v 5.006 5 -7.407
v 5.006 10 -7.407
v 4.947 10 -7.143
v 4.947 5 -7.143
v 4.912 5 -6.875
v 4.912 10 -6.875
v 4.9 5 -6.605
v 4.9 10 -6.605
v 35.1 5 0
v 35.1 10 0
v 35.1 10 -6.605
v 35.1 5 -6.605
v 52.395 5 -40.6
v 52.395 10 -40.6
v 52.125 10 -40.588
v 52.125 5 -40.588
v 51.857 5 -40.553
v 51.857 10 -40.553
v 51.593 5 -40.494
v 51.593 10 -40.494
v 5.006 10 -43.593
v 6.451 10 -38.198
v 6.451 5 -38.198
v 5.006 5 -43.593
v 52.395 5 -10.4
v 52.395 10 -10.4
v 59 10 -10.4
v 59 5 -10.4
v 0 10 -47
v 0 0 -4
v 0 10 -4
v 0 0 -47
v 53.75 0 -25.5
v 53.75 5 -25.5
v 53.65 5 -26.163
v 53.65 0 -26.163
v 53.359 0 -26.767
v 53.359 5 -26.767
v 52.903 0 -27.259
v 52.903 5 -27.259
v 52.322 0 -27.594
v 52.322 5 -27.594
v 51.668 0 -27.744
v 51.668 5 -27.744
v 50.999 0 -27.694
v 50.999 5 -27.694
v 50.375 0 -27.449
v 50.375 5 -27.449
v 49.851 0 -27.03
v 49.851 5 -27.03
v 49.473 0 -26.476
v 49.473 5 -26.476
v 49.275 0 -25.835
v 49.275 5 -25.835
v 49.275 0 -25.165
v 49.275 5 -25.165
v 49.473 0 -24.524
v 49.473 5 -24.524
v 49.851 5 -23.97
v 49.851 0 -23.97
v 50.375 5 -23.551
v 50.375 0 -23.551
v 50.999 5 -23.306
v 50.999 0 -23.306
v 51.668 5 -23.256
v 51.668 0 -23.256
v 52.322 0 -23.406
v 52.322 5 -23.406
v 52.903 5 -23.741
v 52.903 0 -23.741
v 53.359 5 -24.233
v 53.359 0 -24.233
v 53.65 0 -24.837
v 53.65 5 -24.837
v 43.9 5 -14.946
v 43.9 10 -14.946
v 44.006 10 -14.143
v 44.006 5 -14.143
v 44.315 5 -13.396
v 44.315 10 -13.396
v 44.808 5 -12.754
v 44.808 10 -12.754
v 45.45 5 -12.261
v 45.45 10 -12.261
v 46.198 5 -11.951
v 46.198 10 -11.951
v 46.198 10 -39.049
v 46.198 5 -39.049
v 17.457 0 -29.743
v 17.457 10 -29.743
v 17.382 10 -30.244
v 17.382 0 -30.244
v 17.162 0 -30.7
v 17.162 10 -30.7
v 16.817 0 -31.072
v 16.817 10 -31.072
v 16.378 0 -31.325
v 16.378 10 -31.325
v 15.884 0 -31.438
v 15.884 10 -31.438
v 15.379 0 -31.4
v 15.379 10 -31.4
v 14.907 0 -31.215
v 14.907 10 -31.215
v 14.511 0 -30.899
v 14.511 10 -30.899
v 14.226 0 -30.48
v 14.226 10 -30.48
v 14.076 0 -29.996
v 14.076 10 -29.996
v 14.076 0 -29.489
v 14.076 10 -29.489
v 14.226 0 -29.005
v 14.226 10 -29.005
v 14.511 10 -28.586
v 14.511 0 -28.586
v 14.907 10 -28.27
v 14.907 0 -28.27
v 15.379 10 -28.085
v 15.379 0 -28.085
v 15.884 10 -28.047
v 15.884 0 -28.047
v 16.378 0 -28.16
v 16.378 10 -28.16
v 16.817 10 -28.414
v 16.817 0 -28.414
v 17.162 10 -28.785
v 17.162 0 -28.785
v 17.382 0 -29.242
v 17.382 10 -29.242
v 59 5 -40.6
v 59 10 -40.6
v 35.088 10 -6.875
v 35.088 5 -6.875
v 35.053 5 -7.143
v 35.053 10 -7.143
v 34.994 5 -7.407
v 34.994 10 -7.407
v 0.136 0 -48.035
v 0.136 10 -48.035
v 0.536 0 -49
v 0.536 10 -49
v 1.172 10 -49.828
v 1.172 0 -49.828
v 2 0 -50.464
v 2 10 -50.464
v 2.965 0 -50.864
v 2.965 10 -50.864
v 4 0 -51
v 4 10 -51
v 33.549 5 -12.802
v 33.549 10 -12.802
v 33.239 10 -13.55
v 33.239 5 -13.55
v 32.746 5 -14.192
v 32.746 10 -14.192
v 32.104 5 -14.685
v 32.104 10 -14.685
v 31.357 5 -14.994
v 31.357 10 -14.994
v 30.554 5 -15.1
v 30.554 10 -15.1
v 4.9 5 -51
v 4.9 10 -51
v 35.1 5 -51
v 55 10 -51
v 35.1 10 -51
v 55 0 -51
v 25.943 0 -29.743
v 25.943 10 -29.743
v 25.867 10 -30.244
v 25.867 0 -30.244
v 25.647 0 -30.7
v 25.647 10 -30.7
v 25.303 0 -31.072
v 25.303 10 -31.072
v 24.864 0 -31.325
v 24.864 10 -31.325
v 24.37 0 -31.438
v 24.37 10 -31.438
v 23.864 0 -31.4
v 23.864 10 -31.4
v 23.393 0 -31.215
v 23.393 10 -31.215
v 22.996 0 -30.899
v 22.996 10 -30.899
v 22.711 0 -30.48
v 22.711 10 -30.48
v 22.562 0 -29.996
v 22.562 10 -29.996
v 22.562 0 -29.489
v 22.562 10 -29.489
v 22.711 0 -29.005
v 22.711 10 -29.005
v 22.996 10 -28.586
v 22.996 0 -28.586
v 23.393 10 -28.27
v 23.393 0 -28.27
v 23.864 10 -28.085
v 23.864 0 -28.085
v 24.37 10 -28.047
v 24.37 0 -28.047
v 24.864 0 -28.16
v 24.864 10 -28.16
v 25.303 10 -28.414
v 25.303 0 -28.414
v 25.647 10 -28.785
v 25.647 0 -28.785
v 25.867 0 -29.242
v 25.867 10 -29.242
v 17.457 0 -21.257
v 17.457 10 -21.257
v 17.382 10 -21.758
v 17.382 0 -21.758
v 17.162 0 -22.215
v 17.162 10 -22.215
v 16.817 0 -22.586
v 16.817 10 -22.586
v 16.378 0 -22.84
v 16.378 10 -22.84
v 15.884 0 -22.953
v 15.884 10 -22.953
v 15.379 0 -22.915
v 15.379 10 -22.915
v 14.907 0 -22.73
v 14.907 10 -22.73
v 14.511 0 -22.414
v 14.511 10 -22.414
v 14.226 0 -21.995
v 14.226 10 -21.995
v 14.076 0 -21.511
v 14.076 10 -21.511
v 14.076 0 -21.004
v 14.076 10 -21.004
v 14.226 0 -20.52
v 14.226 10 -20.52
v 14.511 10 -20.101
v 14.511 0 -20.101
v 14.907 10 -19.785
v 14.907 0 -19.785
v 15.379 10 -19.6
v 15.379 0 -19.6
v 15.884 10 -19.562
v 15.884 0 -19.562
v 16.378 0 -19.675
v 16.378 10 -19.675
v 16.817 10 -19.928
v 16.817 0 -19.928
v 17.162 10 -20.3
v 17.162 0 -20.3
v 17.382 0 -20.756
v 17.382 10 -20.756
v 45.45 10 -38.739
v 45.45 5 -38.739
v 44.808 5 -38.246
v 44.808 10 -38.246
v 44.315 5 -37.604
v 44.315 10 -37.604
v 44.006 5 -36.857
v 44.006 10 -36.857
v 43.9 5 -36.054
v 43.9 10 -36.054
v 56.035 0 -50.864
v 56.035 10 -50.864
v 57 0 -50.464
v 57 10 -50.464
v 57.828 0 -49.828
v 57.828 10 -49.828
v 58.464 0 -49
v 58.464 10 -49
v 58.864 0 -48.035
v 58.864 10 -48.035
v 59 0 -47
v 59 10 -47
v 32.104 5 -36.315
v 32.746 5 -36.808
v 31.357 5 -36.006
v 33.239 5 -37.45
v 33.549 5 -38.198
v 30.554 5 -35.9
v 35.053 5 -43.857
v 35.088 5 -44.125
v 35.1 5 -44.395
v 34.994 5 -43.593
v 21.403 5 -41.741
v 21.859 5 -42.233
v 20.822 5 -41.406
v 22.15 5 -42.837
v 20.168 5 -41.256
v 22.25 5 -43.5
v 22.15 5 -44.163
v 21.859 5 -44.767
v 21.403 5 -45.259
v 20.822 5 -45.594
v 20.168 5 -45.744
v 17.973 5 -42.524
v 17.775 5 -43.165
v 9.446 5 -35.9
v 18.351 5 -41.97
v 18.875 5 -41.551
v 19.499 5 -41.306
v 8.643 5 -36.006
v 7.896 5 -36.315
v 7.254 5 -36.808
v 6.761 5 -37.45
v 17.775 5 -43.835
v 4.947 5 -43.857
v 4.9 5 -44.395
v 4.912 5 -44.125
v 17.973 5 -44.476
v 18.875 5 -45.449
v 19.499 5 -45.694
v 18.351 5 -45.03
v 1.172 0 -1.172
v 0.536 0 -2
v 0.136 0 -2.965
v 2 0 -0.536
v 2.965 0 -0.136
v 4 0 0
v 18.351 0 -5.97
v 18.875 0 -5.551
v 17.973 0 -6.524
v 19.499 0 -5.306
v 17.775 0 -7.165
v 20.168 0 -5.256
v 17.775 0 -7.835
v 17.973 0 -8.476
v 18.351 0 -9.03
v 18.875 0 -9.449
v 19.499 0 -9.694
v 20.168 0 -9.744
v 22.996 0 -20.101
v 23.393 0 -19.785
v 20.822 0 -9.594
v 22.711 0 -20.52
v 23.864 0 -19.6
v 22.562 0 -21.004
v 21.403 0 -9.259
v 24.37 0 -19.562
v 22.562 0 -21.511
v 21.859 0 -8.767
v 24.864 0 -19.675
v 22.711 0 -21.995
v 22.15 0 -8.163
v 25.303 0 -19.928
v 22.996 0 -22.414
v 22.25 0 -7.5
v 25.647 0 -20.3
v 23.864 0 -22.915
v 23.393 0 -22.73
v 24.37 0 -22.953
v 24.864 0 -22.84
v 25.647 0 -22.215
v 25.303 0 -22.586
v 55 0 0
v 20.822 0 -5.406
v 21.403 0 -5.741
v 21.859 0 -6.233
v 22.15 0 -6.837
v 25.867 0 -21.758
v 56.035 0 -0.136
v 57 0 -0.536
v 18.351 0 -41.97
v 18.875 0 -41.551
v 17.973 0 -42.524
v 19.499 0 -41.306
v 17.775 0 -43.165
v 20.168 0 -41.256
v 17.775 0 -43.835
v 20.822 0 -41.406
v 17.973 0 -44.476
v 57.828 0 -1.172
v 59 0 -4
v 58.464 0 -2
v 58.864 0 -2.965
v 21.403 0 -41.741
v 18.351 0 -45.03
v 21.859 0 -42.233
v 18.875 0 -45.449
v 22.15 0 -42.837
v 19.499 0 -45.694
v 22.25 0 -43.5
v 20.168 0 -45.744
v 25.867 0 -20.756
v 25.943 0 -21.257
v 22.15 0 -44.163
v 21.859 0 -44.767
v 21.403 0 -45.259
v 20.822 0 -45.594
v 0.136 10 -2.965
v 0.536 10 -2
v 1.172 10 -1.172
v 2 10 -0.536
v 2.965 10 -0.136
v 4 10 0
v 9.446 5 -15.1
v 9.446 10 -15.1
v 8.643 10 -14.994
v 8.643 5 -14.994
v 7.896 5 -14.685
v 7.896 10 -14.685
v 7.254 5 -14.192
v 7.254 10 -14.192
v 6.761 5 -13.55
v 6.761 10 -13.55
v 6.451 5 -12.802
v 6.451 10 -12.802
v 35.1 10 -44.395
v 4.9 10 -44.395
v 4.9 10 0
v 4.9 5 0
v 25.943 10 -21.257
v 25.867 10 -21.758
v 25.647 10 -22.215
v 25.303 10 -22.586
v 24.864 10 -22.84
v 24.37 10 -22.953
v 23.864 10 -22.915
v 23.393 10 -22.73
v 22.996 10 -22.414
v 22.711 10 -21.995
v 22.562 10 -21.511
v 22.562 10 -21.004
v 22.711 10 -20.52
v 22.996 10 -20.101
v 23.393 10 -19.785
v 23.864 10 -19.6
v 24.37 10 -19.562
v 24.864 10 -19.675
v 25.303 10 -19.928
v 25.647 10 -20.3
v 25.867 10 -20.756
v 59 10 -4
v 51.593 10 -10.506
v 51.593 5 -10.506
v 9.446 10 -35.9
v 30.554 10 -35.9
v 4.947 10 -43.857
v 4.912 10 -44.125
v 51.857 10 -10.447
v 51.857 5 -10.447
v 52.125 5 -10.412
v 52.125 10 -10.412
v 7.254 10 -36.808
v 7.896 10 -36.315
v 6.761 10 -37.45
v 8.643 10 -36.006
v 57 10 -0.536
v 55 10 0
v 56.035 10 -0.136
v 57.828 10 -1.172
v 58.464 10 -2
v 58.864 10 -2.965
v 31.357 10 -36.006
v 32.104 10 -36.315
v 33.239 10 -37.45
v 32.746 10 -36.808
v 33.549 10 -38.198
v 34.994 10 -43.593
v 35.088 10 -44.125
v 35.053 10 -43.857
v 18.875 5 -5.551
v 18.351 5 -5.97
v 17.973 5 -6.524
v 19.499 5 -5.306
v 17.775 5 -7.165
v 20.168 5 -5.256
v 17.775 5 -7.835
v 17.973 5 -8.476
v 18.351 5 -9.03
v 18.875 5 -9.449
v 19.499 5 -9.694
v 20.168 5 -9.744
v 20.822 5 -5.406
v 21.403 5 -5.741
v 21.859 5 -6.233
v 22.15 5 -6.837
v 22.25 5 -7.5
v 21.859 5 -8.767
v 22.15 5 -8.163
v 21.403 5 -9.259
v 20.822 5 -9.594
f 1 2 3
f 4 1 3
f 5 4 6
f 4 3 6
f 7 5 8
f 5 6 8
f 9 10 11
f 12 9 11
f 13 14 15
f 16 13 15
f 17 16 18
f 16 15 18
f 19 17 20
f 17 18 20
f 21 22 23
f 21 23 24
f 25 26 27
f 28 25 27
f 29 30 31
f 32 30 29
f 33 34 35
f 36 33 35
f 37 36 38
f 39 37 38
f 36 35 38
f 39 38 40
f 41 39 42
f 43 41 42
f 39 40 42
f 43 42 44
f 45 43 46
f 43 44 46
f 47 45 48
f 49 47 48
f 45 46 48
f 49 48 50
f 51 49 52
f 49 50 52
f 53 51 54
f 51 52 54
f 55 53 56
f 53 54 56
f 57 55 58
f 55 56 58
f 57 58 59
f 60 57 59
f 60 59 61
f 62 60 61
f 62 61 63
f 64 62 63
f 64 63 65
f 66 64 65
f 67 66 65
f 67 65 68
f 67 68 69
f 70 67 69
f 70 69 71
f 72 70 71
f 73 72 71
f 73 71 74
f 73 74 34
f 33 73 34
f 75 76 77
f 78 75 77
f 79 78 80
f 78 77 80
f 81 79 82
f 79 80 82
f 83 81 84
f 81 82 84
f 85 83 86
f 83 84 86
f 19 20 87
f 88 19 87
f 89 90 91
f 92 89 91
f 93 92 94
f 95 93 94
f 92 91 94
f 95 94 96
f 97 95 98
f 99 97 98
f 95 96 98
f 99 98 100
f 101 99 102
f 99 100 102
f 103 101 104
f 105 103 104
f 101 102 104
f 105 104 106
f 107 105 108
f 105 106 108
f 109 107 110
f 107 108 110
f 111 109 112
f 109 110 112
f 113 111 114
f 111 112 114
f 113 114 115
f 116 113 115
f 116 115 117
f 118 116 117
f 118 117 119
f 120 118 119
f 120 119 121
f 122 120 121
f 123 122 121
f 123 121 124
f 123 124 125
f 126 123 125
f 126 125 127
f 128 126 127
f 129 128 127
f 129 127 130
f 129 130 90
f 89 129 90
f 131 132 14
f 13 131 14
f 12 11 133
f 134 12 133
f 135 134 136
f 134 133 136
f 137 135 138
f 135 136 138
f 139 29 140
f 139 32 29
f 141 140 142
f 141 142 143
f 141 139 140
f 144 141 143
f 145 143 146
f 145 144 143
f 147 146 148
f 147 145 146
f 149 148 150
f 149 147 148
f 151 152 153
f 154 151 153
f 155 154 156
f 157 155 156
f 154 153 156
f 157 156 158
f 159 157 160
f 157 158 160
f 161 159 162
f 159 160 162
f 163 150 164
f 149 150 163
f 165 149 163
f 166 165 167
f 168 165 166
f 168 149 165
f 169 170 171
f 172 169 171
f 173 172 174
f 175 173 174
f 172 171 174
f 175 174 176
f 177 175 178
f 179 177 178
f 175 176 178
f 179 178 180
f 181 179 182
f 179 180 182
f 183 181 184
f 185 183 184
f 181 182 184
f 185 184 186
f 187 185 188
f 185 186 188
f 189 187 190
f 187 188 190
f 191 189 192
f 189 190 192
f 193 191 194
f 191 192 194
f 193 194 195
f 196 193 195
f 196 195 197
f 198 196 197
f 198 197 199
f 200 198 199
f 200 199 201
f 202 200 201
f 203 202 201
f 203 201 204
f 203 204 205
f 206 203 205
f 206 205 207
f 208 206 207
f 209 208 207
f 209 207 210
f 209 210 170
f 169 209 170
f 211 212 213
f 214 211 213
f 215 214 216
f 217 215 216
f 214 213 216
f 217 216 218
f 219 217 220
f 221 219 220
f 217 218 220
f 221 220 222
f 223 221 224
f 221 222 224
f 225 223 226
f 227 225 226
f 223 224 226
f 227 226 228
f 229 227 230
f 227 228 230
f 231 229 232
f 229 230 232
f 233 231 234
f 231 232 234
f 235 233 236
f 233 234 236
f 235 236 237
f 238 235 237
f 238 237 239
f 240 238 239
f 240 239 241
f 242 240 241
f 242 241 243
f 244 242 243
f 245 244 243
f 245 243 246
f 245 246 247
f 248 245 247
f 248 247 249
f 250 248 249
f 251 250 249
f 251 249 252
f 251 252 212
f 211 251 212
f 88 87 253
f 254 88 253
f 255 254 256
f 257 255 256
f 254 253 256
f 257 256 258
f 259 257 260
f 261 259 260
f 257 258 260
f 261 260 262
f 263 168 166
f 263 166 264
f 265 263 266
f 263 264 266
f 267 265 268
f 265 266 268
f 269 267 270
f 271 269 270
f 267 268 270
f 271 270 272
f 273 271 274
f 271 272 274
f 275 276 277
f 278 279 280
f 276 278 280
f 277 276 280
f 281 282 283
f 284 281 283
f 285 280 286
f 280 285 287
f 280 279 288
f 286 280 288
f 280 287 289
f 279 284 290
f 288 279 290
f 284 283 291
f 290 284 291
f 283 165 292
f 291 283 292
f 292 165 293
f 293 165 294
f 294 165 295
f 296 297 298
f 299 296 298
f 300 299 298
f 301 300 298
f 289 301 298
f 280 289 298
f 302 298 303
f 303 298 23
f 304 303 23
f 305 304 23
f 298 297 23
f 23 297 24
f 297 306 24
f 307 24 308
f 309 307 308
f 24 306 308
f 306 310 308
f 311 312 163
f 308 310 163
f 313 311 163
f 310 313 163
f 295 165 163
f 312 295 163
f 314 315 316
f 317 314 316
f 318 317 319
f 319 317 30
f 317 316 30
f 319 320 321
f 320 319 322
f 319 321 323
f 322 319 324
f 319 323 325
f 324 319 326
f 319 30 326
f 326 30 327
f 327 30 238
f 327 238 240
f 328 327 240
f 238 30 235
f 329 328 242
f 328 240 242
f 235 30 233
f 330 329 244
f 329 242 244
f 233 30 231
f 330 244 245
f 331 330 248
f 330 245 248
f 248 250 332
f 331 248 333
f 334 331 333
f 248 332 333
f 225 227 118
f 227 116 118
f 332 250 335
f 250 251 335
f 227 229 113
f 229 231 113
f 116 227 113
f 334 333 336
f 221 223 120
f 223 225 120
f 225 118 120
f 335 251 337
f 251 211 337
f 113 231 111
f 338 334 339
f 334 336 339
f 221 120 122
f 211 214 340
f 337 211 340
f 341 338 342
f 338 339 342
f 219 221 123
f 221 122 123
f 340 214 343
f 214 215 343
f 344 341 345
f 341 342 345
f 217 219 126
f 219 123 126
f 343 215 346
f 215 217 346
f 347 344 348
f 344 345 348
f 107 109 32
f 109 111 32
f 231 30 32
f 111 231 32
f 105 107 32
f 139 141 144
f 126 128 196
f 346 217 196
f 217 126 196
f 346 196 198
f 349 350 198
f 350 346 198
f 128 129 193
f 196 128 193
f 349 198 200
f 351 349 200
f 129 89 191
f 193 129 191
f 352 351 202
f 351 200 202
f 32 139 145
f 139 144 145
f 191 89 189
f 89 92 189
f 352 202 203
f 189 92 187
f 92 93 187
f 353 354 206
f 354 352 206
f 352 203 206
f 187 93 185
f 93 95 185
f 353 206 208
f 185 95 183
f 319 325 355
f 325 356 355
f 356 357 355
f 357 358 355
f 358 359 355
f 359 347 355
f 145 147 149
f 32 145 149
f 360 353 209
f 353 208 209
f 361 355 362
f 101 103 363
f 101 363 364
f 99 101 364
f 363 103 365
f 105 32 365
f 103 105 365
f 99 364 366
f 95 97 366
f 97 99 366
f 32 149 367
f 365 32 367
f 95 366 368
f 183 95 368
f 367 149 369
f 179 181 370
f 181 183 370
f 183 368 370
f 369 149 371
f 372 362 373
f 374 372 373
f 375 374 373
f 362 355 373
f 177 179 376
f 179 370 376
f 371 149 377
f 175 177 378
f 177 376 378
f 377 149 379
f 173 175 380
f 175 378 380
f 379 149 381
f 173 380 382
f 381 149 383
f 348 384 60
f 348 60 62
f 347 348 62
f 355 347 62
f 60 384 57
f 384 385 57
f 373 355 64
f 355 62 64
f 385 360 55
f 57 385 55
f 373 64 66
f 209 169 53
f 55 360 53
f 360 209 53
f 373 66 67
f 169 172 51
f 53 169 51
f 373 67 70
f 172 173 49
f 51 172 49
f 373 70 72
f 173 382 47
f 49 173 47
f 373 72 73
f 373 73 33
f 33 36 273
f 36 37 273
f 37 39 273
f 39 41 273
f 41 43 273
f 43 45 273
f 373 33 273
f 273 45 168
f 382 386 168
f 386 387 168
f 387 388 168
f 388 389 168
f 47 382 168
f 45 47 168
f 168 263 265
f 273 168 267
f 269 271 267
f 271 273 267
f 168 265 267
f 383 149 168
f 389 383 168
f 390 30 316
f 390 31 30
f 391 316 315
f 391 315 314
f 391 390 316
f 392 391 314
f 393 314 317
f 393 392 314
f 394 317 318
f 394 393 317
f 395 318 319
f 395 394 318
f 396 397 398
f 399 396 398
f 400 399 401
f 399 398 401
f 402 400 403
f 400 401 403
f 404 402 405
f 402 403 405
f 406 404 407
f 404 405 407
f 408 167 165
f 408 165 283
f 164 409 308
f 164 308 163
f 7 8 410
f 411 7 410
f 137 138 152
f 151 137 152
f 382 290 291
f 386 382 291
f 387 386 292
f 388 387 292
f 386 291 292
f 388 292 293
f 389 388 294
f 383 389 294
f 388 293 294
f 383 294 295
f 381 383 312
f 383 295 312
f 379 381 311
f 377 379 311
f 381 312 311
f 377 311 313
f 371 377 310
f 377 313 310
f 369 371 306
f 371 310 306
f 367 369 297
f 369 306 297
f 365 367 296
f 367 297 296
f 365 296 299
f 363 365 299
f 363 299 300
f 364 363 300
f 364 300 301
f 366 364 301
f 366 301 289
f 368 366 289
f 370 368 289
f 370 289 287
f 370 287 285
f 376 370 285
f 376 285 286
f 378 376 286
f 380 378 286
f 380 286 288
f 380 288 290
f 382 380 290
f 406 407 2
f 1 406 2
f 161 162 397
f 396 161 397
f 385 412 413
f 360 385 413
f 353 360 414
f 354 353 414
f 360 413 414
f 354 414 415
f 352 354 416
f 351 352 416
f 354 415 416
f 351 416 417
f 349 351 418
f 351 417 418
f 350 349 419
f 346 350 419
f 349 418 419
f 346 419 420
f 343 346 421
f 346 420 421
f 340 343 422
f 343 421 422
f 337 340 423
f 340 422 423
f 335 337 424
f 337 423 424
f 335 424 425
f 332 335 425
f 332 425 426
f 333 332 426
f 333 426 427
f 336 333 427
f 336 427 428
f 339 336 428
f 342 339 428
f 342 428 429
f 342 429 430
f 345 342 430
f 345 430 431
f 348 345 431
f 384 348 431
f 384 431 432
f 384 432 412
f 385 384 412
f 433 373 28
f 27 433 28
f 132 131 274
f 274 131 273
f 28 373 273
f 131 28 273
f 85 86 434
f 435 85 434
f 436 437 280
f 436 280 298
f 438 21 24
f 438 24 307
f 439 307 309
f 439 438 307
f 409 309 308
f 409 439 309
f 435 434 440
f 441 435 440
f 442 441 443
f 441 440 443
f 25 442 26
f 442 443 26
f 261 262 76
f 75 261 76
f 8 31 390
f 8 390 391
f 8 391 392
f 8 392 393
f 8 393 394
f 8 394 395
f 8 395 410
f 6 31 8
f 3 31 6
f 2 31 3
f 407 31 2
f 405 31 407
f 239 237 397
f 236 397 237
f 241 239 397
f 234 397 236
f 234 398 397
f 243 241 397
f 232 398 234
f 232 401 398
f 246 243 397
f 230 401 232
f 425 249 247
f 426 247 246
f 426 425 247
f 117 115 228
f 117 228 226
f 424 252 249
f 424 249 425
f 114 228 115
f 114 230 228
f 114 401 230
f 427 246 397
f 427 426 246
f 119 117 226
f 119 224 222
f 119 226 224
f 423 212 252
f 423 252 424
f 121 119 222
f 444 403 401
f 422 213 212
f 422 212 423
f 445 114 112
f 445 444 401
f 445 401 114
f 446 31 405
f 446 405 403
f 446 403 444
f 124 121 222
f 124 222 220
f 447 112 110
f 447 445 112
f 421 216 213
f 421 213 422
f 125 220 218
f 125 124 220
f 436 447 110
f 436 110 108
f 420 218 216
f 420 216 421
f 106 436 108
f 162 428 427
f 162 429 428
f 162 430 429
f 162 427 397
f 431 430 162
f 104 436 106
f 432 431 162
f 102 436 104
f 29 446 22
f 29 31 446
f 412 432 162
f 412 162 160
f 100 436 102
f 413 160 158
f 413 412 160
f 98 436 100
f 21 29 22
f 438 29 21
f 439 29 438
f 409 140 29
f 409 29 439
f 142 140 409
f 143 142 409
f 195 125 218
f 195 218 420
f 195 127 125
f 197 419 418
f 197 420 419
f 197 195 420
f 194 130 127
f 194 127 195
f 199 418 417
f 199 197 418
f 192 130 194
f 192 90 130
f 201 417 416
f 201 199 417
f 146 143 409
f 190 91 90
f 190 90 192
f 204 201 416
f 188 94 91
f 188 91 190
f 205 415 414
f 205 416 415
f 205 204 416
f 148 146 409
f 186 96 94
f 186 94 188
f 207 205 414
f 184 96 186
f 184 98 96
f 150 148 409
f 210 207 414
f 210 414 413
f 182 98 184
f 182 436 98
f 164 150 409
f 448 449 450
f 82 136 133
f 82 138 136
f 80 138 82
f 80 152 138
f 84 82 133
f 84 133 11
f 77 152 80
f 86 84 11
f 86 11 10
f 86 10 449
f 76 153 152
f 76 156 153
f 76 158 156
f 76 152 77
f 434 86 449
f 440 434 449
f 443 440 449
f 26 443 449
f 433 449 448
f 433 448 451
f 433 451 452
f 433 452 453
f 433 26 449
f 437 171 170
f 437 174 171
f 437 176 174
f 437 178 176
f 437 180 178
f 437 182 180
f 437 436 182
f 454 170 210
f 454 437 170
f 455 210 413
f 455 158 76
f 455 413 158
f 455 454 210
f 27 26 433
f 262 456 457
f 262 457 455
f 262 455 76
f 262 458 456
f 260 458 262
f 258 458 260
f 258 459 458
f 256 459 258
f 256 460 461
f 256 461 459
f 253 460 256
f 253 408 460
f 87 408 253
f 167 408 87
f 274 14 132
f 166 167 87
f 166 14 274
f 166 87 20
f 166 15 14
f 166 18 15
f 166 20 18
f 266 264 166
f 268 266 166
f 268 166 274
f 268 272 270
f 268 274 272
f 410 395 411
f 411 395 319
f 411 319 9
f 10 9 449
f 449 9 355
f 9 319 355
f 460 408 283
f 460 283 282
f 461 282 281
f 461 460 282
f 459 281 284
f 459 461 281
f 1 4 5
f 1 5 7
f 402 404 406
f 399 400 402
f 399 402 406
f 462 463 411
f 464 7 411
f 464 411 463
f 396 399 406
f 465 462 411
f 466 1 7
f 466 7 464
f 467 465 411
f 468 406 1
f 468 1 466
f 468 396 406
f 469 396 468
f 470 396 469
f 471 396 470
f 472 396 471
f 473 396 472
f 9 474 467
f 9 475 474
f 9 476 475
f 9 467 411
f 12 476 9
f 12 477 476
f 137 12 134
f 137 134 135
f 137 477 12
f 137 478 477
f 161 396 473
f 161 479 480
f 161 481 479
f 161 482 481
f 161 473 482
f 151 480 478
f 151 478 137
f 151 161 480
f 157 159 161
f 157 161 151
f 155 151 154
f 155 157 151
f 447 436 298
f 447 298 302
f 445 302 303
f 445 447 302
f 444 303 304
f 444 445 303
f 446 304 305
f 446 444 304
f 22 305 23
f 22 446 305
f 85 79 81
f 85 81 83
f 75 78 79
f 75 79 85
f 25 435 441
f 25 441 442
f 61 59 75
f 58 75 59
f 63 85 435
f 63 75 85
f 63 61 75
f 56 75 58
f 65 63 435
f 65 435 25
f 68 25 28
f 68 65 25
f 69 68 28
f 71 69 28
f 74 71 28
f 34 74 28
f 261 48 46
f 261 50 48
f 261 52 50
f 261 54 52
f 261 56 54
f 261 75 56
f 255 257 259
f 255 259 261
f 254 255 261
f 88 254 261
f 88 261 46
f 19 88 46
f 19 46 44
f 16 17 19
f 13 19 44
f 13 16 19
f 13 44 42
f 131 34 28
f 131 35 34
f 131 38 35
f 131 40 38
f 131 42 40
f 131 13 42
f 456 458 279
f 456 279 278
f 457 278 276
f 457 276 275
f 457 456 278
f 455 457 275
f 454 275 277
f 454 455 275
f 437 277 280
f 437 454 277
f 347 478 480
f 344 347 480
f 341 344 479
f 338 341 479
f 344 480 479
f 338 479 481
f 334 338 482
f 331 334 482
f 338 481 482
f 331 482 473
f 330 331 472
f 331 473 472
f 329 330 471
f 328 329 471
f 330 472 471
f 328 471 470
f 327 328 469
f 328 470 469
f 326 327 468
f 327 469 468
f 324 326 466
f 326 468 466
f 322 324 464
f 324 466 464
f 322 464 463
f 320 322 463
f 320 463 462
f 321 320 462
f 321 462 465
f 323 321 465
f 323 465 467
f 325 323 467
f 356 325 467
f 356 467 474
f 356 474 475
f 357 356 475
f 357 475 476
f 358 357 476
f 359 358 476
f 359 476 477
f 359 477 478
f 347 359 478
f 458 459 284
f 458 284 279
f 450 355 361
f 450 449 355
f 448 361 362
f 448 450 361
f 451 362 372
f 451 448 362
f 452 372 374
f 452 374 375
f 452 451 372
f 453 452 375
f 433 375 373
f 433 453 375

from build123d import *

# Parameters (mm, degrees)
SKETCH_1_W          = 59
SKETCH_1_H          = 51
EXTRUDE_1_DEPTH     = 10
CUT_EXTRUDE_1_DEPTH = 5
CUT_EXTRUDE_2_DEPTH = 5
HOLE_WIZARD_M31_D   = 3.4
FILLET_1_R          = 4
FILLET_2_R          = 4
HOLE_WIZARD_M41_D   = 4.5
CUT_EXTRUDE_4_DEPTH = 5


with BuildPart() as part:
    # Эскиз1 → Бобышка-Вытянуть1 (new body)
    with BuildSketch(Plane(origin=(0, 0, 0), x_dir=(1, 0, 0), z_dir=(0, 1, 0))):
        with Locations((29.5, 25.5)):
            Rectangle(SKETCH_1_W, SKETCH_1_H)
    extrude(amount=EXTRUDE_1_DEPTH)

    # Эскиз3 → Вырез-Вытянуть1 (cut)
    with BuildSketch(Plane(origin=(28.521351565, 10, -17.681729678), x_dir=(1, 0, 0), z_dir=(0, 1, 0))):
        with BuildLine():
            Line((-23.621351565, -11.07668717), (-23.621351565, -17.781729678))
            Line((-23.621351565, -17.781729678), (6.578648435, -17.781729678))
            Line((6.578648435, -17.781729678), (6.578648435, -11.07668717))
            ThreePointArc((6.578648435, -11.07668717), (6.552127505, -10.672055974), (6.473018496, -10.27434813))
            Line((6.473018496, -10.27434813), (5.027443993, -4.879390638))
            ThreePointArc((5.027443993, -4.879390638), (3.920234361, -3.222334323), (2.033073931, -2.581729678))
            Line((2.033073931, -2.581729678), (-19.075777062, -2.581729678))
            ThreePointArc((-19.075777062, -2.581729678), (-20.962937492, -3.222334323), (-22.070147123, -4.879390638))
            Line((-22.070147123, -4.879390638), (-23.515721627, -10.27434813))
            ThreePointArc((-23.515721627, -10.27434813), (-23.594830635, -10.672055974), (-23.621351565, -11.07668717))
        make_face()
    extrude(amount=-CUT_EXTRUDE_1_DEPTH, mode=Mode.SUBTRACT)

    # Эскиз4 → Вырез-Вытянуть2 (cut)
    with BuildSketch(Plane(origin=(0, 10, 0), x_dir=(1, 0, 0), z_dir=(0, 1, 0))):
        with BuildLine():
            Line((-1.551204442, 38.19766096), (-0.105629939, 43.592618453))
            ThreePointArc((-0.105629939, 43.592618453), (-0.02652093, 43.990326297), (0, 44.394957493))
            Line((0, 44.394957493), (0, 51))
            Line((0, 51), (-30.2, 51))
            Line((-30.2, 51), (-30.2, 44.394957493))
            ThreePointArc((-30.2, 44.394957493), (-30.17347907, 43.990326297), (-30.094370061, 43.592618453))
            Line((-30.094370061, 43.592618453), (-28.648795558, 38.19766096))
            ThreePointArc((-28.648795558, 38.19766096), (-27.541585927, 36.540604645), (-25.654425497, 35.9))
            Line((-25.654425497, 35.9), (-4.545574503, 35.9))
            ThreePointArc((-4.545574503, 35.9), (-2.658414073, 36.540604645), (-1.551204442, 38.19766096))
        make_face()
        with BuildLine():
            Line((46.19766096, 11.951204442), (51.592618453, 10.505629939))
            ThreePointArc((51.592618453, 10.505629939), (51.990326297, 10.42652093), (52.394957493, 10.4))
            Line((52.394957493, 10.4), (59, 10.4))
            Line((59, 10.4), (59, 40.6))
            Line((59, 40.6), (52.394957493, 40.6))
            ThreePointArc((52.394957493, 40.6), (51.990326297, 40.57347907), (51.592618453, 40.494370061))
            Line((51.592618453, 40.494370061), (46.19766096, 39.048795558))
            ThreePointArc((46.19766096, 39.048795558), (44.540604645, 37.941585927), (43.9, 36.054425497))
            Line((43.9, 36.054425497), (43.9, 14.945574503))
            ThreePointArc((43.9, 14.945574503), (44.540604645, 13.058414073), (46.19766096, 11.951204442))
        make_face()
    extrude(amount=-CUT_EXTRUDE_2_DEPTH, mode=Mode.SUBTRACT)

    # Отверстие с зазором M31 (through all)
    with Locations(Plane(origin=(0, 0, 0), x_dir=(-1, 0, 0), z_dir=(0, -1, 0))):
        with Locations((-24.242640687, 29.742640687), (-15.757359313, 29.742640687), (-15.757359313, 21.257359313), (-24.242640687, 21.257359313)):
            Hole(HOLE_WIZARD_M31_D / 2)

    # Скругление1
    fillet_1_edges = [part.edges().sort_by_distance(p)[0] for p in [
        (0, 5, -51),
        (0, 5, 0),
    ]]
    fillet(fillet_1_edges, radius=FILLET_1_R)

    # Скругление2
    fillet_2_edges = [part.edges().sort_by_distance(p)[0] for p in [
        (59, 5, -51),
        (59, 5, 0),
    ]]
    fillet(fillet_2_edges, radius=FILLET_2_R)

    # Отверстие с зазором M41 (through all)
    with Locations(Plane(origin=(0, 0, 0), x_dir=(-1, 0, 0), z_dir=(0, -1, 0))):
        with Locations((-51.5, 25.5), (-20, 43.5), (-20, 7.5)):
            Hole(HOLE_WIZARD_M41_D / 2)

    # Эскиз12 → Вырез-Вытянуть4 (cut)
    with BuildSketch(Plane(origin=(0, 10, 0), x_dir=(1, 0, 0), z_dir=(0, 1, 0))):
        with BuildLine():
            Line((4.9, 44.394957493), (4.9, 51))
            Line((4.9, 51), (35.1, 51))
            Line((35.1, 51), (35.1, 44.394957493))
            ThreePointArc((35.1, 44.394957493), (35.07347907, 43.990326297), (34.994370061, 43.592618453))
            Line((34.994370061, 43.592618453), (33.548795558, 38.19766096))
            ThreePointArc((33.548795558, 38.19766096), (32.441585927, 36.540604645), (30.554425497, 35.9))
            Line((30.554425497, 35.9), (9.445574503, 35.9))
            ThreePointArc((9.445574503, 35.9), (7.558414073, 36.540604645), (6.451204442, 38.19766096))
            Line((6.451204442, 38.19766096), (5.005629939, 43.592618453))
            ThreePointArc((5.005629939, 43.592618453), (4.92652093, 43.990326297), (4.9, 44.394957493))
        make_face()
    extrude(amount=-CUT_EXTRUDE_4_DEPTH, mode=Mode.SUBTRACT)


solid = part.part
